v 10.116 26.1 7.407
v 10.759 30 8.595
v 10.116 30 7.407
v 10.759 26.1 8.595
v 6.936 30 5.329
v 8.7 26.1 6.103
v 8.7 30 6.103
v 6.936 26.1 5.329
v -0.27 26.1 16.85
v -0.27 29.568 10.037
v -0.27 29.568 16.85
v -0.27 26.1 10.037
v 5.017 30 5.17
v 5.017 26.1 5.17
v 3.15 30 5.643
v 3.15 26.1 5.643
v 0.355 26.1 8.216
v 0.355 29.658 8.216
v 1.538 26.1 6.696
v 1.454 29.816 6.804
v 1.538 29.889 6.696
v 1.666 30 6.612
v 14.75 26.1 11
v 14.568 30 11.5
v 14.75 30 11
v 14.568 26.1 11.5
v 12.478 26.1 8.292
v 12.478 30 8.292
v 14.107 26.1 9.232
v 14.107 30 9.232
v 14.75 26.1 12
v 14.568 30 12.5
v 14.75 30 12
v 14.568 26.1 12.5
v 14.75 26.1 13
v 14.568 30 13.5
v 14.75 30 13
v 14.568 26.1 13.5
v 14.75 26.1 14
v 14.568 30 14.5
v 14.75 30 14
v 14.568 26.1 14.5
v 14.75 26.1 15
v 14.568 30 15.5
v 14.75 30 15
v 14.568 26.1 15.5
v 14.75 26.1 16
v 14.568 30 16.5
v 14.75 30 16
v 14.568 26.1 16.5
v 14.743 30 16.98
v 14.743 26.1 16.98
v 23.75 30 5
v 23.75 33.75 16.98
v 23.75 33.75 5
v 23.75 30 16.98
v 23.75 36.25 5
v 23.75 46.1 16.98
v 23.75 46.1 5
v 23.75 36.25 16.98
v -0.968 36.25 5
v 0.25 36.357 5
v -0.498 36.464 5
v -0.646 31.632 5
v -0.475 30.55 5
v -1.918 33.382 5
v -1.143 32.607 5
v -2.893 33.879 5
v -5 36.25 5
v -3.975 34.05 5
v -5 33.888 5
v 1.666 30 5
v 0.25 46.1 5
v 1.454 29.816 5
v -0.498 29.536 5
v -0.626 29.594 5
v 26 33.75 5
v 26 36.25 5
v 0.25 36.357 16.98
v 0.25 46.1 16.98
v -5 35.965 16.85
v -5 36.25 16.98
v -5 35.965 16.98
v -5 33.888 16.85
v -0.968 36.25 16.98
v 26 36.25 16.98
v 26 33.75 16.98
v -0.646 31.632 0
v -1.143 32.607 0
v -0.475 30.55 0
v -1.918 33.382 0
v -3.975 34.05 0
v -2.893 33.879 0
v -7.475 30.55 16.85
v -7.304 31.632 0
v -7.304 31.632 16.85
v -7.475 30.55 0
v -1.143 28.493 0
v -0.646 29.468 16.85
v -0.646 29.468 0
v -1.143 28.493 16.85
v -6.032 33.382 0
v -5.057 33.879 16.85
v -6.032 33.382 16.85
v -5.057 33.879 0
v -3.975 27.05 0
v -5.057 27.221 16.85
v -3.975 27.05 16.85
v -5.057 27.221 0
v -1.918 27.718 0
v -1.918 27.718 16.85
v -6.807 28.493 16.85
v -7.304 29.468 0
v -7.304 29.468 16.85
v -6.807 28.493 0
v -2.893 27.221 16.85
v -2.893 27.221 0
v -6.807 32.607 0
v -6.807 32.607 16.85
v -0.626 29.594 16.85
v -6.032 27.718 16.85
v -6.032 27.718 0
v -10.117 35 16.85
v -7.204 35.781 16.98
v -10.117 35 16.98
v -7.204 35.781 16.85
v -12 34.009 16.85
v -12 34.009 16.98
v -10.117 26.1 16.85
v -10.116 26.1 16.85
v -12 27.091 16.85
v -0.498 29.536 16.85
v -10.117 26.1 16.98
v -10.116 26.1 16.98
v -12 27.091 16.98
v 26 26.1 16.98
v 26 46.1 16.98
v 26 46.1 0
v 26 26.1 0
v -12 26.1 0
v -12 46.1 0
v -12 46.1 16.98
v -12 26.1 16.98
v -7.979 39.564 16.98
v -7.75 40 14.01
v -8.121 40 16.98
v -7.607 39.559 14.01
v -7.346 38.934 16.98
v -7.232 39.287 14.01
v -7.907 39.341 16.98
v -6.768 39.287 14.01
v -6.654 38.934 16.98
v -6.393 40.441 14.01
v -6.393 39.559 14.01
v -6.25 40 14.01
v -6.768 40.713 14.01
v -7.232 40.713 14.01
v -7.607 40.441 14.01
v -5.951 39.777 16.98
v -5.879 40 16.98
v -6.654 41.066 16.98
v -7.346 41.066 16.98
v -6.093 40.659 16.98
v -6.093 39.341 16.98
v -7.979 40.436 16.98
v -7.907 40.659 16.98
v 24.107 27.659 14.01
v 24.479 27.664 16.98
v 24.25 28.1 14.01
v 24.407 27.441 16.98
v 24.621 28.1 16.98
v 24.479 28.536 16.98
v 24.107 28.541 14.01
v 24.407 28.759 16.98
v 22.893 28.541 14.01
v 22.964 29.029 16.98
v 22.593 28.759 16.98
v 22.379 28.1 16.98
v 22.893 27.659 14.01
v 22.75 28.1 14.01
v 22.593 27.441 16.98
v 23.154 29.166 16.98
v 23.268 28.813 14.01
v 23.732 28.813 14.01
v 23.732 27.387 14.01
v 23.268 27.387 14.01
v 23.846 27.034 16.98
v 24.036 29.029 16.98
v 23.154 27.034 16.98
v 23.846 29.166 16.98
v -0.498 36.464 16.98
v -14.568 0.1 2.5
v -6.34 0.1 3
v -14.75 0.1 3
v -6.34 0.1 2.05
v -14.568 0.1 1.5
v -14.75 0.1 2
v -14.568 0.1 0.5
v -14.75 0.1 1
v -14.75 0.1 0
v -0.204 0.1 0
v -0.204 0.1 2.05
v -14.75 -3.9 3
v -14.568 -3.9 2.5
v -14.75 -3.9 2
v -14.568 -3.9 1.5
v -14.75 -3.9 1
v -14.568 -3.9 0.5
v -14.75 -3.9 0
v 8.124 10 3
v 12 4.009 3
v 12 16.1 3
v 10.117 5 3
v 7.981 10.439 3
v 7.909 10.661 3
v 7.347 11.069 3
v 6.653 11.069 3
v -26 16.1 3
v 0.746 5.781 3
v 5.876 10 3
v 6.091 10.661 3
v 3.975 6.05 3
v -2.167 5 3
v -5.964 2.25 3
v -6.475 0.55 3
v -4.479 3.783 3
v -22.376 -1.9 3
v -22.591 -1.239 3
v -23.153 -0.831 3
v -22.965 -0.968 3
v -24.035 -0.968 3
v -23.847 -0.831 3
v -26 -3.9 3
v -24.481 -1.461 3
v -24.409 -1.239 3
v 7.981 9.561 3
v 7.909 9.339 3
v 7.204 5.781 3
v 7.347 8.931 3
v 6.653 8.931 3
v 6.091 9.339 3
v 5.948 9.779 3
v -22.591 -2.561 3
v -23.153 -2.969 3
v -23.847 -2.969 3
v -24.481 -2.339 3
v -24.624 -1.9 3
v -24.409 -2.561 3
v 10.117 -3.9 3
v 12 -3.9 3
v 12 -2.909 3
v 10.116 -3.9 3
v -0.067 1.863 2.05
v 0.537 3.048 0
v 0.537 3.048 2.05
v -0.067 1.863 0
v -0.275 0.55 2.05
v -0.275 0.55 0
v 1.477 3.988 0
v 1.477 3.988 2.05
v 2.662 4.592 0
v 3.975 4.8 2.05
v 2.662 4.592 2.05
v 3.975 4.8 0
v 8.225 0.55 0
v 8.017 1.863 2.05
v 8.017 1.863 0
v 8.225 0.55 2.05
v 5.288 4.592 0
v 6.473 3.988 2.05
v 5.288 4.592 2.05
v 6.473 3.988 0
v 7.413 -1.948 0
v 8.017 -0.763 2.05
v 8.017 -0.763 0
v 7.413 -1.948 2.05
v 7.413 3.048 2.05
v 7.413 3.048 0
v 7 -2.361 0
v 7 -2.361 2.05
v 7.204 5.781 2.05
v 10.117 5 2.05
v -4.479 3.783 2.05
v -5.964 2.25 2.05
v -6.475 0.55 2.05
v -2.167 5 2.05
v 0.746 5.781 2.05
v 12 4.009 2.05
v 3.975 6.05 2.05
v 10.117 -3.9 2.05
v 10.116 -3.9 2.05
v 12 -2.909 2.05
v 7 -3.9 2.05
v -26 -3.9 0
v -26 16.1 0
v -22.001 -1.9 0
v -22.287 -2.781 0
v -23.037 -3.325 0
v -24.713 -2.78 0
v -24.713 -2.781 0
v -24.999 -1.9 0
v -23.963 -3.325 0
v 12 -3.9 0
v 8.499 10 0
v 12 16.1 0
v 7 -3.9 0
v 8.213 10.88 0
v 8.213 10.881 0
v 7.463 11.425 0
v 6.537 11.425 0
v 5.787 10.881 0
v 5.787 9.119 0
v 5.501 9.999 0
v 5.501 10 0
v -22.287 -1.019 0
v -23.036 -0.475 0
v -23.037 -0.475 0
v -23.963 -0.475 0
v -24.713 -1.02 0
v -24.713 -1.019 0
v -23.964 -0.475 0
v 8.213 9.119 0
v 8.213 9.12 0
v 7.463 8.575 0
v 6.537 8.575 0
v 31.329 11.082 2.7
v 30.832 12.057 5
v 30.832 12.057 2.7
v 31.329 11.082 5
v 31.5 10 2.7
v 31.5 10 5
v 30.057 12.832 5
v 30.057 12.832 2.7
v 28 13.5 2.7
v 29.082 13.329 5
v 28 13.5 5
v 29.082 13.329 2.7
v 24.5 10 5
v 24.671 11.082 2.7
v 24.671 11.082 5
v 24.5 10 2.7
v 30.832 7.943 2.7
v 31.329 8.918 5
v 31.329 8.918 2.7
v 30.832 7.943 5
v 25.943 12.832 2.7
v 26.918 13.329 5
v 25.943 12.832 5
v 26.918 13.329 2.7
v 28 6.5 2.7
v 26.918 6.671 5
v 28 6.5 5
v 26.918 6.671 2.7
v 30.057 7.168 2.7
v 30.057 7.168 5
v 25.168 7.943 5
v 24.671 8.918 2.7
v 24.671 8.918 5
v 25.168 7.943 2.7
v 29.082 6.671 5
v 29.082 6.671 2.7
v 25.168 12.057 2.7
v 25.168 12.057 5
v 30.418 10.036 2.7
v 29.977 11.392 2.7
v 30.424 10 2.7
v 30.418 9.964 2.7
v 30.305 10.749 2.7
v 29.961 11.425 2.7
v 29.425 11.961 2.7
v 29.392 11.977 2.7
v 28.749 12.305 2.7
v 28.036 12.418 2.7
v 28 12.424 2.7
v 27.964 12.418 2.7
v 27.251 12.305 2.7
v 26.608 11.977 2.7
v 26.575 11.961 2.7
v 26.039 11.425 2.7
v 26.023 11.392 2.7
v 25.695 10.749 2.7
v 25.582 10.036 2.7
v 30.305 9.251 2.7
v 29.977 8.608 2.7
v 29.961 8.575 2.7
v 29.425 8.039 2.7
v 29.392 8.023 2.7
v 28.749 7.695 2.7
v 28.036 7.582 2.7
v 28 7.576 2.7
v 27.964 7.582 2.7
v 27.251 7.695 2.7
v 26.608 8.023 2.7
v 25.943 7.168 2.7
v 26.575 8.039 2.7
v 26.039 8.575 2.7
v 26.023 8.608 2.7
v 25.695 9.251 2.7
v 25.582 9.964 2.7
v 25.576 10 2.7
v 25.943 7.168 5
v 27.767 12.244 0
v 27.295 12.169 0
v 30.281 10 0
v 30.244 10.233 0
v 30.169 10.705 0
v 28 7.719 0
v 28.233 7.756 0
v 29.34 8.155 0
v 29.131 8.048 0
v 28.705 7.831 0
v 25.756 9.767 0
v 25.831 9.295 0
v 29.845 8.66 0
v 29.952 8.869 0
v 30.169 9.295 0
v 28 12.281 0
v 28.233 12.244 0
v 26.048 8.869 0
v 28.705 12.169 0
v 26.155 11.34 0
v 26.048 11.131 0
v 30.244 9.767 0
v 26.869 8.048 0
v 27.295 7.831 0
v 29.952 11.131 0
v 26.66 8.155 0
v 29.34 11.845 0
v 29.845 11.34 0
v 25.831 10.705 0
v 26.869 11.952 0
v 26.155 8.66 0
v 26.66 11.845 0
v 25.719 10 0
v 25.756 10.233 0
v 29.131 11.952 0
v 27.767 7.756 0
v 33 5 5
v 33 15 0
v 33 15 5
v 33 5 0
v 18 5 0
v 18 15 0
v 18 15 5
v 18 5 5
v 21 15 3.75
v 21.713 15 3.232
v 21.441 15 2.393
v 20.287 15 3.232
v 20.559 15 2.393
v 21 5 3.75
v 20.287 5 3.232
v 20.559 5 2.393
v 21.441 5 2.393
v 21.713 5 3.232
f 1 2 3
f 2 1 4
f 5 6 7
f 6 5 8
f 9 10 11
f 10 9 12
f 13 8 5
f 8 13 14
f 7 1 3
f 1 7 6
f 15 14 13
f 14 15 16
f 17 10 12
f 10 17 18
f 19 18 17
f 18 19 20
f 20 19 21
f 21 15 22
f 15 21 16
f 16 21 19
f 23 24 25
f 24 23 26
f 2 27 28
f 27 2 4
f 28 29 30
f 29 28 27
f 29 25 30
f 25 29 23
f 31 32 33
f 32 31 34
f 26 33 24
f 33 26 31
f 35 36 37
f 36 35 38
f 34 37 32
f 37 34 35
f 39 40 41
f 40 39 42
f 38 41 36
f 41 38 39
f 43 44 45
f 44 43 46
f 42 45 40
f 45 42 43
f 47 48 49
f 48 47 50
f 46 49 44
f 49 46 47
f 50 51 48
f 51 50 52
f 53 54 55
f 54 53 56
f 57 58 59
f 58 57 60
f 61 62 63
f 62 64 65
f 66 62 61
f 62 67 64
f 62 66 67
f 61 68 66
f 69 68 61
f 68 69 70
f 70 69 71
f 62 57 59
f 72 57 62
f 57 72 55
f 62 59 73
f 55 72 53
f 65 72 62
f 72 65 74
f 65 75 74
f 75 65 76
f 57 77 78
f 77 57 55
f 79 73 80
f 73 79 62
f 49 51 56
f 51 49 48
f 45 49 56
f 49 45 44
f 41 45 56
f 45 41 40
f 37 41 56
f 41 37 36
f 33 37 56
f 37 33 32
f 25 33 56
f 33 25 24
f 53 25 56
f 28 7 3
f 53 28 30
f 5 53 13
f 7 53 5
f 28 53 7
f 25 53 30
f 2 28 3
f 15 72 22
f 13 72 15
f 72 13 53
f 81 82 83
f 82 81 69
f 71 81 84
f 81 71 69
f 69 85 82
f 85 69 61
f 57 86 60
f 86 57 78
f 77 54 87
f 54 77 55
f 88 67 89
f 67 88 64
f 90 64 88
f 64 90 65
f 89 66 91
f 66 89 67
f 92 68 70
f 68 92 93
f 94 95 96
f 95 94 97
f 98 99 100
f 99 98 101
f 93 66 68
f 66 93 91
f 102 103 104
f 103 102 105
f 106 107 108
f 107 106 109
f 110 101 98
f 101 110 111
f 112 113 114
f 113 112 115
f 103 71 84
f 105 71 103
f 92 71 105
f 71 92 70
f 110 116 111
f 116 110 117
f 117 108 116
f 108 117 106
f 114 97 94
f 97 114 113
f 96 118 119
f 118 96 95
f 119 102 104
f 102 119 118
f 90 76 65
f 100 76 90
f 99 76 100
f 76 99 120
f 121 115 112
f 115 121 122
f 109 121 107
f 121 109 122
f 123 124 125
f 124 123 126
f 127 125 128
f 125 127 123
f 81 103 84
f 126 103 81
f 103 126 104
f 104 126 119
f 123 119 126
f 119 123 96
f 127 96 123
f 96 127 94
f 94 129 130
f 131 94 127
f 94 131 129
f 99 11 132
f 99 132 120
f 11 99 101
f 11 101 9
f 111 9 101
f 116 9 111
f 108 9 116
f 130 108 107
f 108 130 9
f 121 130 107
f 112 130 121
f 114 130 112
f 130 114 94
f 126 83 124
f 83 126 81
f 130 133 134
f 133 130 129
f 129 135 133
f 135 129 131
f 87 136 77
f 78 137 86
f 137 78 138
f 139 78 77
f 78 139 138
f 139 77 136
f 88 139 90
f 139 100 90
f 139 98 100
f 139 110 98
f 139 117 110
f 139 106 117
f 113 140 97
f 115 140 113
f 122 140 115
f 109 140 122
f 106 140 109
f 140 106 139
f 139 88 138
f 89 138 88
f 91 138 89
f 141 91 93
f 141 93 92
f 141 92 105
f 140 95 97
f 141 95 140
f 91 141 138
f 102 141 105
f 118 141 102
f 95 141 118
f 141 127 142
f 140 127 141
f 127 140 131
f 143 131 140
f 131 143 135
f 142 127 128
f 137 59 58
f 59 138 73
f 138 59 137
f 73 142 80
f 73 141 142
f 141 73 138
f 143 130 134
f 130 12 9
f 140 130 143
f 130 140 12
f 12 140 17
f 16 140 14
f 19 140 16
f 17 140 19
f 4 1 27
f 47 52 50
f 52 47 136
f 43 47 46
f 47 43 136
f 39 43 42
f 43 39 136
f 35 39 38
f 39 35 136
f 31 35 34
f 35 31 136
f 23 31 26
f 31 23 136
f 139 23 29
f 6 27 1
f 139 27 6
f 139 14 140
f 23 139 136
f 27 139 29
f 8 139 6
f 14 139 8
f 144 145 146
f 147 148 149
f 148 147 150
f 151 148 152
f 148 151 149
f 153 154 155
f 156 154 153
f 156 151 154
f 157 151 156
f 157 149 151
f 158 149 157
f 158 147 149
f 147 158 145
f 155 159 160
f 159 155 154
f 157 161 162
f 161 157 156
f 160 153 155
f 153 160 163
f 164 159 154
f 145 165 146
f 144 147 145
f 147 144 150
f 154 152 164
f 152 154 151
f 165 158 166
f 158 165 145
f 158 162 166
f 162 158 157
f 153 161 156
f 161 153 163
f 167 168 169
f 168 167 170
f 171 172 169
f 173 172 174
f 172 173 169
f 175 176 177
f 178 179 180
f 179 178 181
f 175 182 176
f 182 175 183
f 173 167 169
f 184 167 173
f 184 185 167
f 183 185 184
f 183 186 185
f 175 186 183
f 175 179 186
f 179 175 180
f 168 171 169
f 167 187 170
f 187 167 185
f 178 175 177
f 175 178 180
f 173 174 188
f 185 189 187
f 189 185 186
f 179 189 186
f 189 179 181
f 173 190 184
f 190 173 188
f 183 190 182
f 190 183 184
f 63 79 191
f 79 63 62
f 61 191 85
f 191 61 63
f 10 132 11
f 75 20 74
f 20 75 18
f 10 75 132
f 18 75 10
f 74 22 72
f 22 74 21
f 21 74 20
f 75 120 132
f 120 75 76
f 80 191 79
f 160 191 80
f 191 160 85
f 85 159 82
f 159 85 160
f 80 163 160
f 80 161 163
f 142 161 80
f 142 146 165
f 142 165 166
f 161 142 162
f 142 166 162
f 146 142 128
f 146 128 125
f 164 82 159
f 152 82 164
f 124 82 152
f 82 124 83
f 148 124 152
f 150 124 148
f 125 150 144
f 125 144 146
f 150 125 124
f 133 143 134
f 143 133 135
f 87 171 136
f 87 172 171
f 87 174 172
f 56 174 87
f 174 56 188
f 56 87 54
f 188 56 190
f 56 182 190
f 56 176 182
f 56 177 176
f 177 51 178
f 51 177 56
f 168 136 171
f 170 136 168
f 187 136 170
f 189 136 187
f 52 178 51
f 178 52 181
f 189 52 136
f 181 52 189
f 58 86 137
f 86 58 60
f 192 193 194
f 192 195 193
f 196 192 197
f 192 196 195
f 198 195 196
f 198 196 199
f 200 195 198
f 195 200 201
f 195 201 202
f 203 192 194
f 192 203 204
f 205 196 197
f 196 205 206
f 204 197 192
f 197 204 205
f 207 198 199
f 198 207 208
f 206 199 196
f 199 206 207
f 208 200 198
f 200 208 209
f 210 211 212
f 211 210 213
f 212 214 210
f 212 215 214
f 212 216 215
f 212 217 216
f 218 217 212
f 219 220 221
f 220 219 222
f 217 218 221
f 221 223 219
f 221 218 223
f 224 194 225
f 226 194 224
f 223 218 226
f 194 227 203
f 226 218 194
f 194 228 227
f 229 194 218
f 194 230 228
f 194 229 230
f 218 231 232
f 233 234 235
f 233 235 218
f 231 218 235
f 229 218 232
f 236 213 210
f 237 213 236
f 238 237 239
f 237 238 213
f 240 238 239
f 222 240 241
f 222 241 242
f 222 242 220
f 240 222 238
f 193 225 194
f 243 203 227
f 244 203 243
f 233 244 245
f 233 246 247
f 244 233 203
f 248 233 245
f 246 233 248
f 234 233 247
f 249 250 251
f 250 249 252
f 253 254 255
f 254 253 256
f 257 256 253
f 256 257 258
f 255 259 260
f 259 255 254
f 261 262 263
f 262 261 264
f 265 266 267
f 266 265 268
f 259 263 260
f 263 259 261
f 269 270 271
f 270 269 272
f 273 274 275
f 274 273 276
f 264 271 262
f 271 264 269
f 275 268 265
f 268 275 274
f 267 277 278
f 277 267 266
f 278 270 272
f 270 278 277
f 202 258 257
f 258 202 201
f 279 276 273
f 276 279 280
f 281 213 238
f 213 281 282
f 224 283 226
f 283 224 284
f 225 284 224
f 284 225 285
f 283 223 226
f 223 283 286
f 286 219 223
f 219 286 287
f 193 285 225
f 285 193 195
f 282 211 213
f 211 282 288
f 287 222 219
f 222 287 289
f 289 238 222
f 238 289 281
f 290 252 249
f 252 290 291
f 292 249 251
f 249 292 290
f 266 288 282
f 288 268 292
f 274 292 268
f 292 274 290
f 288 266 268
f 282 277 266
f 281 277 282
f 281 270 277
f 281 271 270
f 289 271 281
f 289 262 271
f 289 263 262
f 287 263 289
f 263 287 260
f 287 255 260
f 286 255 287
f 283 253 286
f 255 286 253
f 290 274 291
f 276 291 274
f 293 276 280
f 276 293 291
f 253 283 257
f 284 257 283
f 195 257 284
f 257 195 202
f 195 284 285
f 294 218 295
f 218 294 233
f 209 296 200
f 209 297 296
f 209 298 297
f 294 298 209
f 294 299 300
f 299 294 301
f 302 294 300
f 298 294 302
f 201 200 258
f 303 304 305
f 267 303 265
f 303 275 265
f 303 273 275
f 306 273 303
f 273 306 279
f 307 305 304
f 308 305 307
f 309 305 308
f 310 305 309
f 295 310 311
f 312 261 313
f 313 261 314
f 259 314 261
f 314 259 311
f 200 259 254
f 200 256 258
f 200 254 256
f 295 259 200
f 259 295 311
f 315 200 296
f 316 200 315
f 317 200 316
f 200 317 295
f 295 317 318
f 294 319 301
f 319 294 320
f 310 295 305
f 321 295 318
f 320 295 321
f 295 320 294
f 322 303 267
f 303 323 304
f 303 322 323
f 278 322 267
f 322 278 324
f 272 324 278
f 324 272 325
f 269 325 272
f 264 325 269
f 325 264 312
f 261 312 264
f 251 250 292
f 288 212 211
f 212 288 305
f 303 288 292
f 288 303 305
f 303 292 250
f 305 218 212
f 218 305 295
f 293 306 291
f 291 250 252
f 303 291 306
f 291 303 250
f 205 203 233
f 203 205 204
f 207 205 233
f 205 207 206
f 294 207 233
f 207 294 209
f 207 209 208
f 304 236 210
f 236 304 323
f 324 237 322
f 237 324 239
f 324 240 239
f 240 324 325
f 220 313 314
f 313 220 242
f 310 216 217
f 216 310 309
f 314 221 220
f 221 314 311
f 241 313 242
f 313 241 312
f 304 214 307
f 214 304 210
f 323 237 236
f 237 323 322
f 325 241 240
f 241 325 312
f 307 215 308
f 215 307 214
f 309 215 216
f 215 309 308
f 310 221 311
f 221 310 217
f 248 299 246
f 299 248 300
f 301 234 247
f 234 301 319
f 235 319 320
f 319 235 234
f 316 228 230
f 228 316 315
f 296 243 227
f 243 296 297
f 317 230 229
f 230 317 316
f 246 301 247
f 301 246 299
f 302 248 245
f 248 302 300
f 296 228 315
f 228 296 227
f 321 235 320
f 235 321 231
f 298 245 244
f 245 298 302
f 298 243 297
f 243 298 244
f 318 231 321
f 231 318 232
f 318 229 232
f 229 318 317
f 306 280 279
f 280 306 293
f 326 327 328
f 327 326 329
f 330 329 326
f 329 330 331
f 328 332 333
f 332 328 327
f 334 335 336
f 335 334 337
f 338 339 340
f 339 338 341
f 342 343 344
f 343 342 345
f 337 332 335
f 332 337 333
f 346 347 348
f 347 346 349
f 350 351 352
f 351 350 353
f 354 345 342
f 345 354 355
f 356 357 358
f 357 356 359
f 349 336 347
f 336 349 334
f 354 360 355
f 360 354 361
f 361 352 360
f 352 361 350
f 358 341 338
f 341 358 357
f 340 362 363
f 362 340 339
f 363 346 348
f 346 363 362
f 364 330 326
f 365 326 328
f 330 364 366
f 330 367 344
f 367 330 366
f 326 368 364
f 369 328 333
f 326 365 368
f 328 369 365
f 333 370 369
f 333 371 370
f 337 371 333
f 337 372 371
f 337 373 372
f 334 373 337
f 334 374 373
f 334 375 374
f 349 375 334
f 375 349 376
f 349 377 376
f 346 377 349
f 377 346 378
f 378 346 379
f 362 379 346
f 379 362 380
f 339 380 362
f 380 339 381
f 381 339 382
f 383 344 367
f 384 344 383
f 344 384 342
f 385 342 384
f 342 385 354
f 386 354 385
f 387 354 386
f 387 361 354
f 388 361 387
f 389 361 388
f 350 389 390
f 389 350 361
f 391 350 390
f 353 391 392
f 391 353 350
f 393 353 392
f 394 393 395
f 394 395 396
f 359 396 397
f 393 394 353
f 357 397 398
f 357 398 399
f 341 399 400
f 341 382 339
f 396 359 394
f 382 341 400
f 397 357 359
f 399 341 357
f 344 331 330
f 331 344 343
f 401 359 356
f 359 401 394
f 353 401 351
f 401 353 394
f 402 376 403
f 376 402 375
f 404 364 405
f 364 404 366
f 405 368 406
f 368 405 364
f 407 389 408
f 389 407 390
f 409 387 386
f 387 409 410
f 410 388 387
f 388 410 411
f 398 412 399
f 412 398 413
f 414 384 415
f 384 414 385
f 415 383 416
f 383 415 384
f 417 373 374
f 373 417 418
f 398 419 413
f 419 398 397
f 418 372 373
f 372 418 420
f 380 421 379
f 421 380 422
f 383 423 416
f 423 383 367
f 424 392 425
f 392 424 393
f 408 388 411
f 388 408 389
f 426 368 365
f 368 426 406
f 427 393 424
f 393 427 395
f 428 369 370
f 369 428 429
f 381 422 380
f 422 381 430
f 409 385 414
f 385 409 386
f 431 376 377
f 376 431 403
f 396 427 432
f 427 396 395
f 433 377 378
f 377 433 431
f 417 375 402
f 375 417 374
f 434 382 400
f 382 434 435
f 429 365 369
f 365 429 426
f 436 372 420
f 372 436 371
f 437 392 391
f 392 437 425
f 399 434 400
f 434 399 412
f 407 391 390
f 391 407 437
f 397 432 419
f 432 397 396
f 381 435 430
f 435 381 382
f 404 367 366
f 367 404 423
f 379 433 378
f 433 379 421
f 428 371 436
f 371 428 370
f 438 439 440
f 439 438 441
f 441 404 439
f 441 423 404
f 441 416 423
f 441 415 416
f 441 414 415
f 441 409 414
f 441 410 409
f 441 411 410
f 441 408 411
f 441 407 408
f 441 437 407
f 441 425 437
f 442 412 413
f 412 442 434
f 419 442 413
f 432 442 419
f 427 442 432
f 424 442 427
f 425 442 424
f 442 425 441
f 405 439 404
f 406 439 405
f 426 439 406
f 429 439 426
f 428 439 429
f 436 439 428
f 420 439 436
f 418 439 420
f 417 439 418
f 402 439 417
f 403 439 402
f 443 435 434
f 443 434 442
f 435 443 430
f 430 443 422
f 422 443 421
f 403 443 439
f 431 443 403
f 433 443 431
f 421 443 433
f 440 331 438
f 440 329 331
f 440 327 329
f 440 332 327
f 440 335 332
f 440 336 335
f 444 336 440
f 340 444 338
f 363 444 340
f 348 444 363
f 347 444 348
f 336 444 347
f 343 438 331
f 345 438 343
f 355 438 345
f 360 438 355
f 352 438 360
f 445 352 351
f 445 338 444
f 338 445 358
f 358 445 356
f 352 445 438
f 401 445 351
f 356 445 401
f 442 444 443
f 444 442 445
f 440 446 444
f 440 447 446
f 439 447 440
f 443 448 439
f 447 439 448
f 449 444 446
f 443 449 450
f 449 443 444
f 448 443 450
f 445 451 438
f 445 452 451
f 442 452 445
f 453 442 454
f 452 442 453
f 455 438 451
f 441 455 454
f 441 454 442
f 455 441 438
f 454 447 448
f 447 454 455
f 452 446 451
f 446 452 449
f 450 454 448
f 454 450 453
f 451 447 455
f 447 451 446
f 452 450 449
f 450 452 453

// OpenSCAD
module servo(vert=false){
translate([0.25,0,0])cube([23.5,23,12]);
translate([-5,3.75,0])cube([34,2.5,12]);
for(i=[0:25])
	translate([((vert)?-1:0)*i,0,((vert)?0:1)*i]){
		translate([11/2,0.1,6])rotate([90])cylinder(r=11.7/2,h=4.1);
		translate([12,0.1,6])rotate([90])cylinder(r=5.5/2,h=4.1);
}

translate([-6,23-6.1,0])cube([6.3,6.2,12]);
}

module syringe(){
cylinder(r=7.0/2,h=76,$fn=20);
translate([0,0,75.5])cylinder(r1=4.9/2,r2=4/2,h=8.5,$fn=20);
translate([0,0,-10.1])cylinder(r=4.5/2,h=10,$fn=20);
translate([0,0,-20+0.5])cylinder(r=8.5/2,h=20,$fn=20);
scale(1.1)scale([1.9,1,1])cylinder(r=5,h=1,$fn=20);
}
module casing(){
difference(){
translate([-12,-3.9,-5])cube([38,20,20]);
servo();
translate([-7.95/2,0.55,12.95])mirror([0,0,1])syringe();
translate([-7,10,9.01])cylinder(r1=0.75,r2=1.5,h=6,$fn=10);
translate([23.5,-1.9,9.01])cylinder(r1=0.75,r2=1.5,h=6,$fn=10);
translate([0,3,0])cylinder(r=3.5,h=12);
}
}
module casinglid(){
translate([0,30,5])difference(){
casing();
translate([-20,-10,12-.02])cube([50,30,50]);
}

translate([0,0,15])rotate([0,180,0])difference(){
casing();
translate([-20,-10,12-50])cube([50,30,50]);
translate([-7,-4,12])cube([8,3,3]);
}
}
module syringecage(){
mirror([0,0,1])translate([0,0,-5])difference(){
translate([-10,-5,0])cube([15,10,5]);
translate([-7,-7,2])rotate([0,90,90])cylinder(r=0.75,h=30);
translate([0,0,-73.7])syringe();
}
}
*for(i=[0:1])for(j=[0:2])translate([25*i,15*j])syringecage();
casinglid();
translate([28,10,0])syringecage();

%cube([200,200,0.01],true);
